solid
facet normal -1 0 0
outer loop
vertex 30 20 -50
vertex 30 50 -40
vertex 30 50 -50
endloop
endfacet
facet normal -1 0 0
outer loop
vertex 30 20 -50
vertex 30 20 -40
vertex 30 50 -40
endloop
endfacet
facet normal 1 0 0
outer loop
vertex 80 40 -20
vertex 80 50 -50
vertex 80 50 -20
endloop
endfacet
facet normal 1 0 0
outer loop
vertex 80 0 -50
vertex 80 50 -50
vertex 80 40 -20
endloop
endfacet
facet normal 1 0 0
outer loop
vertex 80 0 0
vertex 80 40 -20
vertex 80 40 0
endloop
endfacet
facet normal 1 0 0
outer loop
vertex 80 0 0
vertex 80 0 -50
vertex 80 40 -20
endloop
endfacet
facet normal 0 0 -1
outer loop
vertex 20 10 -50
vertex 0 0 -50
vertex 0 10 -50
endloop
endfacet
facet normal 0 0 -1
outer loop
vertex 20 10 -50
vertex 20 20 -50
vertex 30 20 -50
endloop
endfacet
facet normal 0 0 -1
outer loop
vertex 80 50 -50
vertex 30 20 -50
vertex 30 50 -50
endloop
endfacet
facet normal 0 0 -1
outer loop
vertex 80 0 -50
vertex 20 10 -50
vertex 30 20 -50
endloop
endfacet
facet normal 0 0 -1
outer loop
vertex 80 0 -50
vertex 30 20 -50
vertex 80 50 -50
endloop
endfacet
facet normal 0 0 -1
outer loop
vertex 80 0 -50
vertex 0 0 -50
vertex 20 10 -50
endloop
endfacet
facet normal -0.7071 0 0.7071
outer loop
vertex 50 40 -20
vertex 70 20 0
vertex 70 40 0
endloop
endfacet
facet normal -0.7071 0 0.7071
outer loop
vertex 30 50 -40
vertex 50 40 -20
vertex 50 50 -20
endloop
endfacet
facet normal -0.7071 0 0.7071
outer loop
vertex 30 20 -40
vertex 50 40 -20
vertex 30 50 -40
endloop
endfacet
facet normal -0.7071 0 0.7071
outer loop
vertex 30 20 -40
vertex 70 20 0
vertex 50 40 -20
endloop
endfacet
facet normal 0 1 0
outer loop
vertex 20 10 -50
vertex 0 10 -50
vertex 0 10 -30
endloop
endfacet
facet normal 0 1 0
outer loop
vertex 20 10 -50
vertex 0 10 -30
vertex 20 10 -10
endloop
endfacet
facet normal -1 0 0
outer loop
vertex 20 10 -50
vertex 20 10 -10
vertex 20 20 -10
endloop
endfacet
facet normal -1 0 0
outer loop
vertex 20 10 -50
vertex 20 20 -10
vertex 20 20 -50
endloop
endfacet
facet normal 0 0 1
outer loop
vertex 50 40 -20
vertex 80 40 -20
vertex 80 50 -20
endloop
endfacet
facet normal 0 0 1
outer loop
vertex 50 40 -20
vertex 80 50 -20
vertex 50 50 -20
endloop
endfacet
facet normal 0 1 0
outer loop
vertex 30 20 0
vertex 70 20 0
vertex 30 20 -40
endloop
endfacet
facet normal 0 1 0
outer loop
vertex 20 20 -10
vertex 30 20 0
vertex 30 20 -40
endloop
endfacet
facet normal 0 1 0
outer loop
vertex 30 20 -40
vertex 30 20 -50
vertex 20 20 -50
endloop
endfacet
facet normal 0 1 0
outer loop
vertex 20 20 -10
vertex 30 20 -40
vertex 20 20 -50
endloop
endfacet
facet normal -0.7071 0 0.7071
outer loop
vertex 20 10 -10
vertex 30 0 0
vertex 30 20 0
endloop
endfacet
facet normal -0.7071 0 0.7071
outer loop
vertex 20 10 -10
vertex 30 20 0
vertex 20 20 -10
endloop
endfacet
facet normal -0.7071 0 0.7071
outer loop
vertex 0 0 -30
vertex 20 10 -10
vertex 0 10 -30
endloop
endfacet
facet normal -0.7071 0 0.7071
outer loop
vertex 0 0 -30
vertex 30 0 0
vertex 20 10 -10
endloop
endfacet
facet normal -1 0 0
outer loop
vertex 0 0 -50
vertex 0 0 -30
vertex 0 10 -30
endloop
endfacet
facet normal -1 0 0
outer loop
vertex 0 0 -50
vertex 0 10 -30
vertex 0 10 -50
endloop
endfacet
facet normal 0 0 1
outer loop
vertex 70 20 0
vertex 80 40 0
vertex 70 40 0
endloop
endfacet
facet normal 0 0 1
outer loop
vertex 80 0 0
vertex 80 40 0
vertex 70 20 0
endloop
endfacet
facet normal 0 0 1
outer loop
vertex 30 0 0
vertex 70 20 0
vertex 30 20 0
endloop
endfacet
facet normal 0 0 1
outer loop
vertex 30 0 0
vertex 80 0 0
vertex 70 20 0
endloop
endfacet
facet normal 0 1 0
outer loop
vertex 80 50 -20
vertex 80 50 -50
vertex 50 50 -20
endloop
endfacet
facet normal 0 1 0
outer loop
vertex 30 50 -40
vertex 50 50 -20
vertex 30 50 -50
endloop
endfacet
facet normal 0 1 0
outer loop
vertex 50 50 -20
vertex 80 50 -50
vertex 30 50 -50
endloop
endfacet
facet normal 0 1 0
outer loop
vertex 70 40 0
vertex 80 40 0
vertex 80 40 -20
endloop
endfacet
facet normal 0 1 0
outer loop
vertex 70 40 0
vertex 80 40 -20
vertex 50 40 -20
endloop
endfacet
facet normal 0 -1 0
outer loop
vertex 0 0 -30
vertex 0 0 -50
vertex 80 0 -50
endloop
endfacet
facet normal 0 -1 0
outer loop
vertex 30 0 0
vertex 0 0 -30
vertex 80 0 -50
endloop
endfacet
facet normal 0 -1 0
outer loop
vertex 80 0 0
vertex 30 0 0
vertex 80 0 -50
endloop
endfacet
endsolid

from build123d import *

# Parameters (mm, degrees)
SKETCH1_W           = 80
SKETCH1_H           = 50
BOSS_EXTRUDE1_DEPTH = 10
CUT_EXTRUDE1_DEPTH  = 10
BOSS_EXTRUDE2_DEPTH = 10
BOSS_EXTRUDE3_DEPTH = 20
BOSS_EXTRUDE4_DEPTH = 10


with BuildPart() as part:
    # Sketch1 → Boss-Extrude1 (new body)
    with BuildSketch(Plane(origin=(0, 0, 0), x_dir=(1, 0, 0), z_dir=(0, 1, 0))):
        with Locations((40, 25)):
            Rectangle(SKETCH1_W, SKETCH1_H)
    extrude(amount=BOSS_EXTRUDE1_DEPTH)

    # Sketch2 → Cut-Extrude1 (cut)
    with BuildSketch(Plane(origin=(0, 10, 0), x_dir=(1, 0, 0), z_dir=(0, 1, 0))):
        Polygon((0, 30), (30, 0), (0, 0), align=None)
    extrude(amount=-CUT_EXTRUDE1_DEPTH, mode=Mode.SUBTRACT)

    # Sketch3 → Boss-Extrude2 (add)
    with BuildSketch(Plane(origin=(0, 10, 0), x_dir=(1, 0, 0), z_dir=(0, 1, 0))):
        Polygon((80, 50), (80, 0), (30, 0), (20, 10), (20, 50), align=None)
    extrude(amount=BOSS_EXTRUDE2_DEPTH)

    # Sketch4 → Boss-Extrude3 (add)
    with BuildSketch(Plane(origin=(0, 20, 0), x_dir=(1, 0, 0), z_dir=(0, 1, 0))):
        Polygon((80, 50), (80, 0), (70, 0), (30, 40), (30, 50), align=None)
    extrude(amount=BOSS_EXTRUDE3_DEPTH)

    # Sketch5 → Boss-Extrude4 (add)
    with BuildSketch(Plane(origin=(0, 40, 0), x_dir=(1, 0, 0), z_dir=(0, 1, 0))):
        Polygon((80, 50), (80, 20), (50, 20), (30, 40), (30, 50), align=None)
    extrude(amount=BOSS_EXTRUDE4_DEPTH)


solid = part.part
